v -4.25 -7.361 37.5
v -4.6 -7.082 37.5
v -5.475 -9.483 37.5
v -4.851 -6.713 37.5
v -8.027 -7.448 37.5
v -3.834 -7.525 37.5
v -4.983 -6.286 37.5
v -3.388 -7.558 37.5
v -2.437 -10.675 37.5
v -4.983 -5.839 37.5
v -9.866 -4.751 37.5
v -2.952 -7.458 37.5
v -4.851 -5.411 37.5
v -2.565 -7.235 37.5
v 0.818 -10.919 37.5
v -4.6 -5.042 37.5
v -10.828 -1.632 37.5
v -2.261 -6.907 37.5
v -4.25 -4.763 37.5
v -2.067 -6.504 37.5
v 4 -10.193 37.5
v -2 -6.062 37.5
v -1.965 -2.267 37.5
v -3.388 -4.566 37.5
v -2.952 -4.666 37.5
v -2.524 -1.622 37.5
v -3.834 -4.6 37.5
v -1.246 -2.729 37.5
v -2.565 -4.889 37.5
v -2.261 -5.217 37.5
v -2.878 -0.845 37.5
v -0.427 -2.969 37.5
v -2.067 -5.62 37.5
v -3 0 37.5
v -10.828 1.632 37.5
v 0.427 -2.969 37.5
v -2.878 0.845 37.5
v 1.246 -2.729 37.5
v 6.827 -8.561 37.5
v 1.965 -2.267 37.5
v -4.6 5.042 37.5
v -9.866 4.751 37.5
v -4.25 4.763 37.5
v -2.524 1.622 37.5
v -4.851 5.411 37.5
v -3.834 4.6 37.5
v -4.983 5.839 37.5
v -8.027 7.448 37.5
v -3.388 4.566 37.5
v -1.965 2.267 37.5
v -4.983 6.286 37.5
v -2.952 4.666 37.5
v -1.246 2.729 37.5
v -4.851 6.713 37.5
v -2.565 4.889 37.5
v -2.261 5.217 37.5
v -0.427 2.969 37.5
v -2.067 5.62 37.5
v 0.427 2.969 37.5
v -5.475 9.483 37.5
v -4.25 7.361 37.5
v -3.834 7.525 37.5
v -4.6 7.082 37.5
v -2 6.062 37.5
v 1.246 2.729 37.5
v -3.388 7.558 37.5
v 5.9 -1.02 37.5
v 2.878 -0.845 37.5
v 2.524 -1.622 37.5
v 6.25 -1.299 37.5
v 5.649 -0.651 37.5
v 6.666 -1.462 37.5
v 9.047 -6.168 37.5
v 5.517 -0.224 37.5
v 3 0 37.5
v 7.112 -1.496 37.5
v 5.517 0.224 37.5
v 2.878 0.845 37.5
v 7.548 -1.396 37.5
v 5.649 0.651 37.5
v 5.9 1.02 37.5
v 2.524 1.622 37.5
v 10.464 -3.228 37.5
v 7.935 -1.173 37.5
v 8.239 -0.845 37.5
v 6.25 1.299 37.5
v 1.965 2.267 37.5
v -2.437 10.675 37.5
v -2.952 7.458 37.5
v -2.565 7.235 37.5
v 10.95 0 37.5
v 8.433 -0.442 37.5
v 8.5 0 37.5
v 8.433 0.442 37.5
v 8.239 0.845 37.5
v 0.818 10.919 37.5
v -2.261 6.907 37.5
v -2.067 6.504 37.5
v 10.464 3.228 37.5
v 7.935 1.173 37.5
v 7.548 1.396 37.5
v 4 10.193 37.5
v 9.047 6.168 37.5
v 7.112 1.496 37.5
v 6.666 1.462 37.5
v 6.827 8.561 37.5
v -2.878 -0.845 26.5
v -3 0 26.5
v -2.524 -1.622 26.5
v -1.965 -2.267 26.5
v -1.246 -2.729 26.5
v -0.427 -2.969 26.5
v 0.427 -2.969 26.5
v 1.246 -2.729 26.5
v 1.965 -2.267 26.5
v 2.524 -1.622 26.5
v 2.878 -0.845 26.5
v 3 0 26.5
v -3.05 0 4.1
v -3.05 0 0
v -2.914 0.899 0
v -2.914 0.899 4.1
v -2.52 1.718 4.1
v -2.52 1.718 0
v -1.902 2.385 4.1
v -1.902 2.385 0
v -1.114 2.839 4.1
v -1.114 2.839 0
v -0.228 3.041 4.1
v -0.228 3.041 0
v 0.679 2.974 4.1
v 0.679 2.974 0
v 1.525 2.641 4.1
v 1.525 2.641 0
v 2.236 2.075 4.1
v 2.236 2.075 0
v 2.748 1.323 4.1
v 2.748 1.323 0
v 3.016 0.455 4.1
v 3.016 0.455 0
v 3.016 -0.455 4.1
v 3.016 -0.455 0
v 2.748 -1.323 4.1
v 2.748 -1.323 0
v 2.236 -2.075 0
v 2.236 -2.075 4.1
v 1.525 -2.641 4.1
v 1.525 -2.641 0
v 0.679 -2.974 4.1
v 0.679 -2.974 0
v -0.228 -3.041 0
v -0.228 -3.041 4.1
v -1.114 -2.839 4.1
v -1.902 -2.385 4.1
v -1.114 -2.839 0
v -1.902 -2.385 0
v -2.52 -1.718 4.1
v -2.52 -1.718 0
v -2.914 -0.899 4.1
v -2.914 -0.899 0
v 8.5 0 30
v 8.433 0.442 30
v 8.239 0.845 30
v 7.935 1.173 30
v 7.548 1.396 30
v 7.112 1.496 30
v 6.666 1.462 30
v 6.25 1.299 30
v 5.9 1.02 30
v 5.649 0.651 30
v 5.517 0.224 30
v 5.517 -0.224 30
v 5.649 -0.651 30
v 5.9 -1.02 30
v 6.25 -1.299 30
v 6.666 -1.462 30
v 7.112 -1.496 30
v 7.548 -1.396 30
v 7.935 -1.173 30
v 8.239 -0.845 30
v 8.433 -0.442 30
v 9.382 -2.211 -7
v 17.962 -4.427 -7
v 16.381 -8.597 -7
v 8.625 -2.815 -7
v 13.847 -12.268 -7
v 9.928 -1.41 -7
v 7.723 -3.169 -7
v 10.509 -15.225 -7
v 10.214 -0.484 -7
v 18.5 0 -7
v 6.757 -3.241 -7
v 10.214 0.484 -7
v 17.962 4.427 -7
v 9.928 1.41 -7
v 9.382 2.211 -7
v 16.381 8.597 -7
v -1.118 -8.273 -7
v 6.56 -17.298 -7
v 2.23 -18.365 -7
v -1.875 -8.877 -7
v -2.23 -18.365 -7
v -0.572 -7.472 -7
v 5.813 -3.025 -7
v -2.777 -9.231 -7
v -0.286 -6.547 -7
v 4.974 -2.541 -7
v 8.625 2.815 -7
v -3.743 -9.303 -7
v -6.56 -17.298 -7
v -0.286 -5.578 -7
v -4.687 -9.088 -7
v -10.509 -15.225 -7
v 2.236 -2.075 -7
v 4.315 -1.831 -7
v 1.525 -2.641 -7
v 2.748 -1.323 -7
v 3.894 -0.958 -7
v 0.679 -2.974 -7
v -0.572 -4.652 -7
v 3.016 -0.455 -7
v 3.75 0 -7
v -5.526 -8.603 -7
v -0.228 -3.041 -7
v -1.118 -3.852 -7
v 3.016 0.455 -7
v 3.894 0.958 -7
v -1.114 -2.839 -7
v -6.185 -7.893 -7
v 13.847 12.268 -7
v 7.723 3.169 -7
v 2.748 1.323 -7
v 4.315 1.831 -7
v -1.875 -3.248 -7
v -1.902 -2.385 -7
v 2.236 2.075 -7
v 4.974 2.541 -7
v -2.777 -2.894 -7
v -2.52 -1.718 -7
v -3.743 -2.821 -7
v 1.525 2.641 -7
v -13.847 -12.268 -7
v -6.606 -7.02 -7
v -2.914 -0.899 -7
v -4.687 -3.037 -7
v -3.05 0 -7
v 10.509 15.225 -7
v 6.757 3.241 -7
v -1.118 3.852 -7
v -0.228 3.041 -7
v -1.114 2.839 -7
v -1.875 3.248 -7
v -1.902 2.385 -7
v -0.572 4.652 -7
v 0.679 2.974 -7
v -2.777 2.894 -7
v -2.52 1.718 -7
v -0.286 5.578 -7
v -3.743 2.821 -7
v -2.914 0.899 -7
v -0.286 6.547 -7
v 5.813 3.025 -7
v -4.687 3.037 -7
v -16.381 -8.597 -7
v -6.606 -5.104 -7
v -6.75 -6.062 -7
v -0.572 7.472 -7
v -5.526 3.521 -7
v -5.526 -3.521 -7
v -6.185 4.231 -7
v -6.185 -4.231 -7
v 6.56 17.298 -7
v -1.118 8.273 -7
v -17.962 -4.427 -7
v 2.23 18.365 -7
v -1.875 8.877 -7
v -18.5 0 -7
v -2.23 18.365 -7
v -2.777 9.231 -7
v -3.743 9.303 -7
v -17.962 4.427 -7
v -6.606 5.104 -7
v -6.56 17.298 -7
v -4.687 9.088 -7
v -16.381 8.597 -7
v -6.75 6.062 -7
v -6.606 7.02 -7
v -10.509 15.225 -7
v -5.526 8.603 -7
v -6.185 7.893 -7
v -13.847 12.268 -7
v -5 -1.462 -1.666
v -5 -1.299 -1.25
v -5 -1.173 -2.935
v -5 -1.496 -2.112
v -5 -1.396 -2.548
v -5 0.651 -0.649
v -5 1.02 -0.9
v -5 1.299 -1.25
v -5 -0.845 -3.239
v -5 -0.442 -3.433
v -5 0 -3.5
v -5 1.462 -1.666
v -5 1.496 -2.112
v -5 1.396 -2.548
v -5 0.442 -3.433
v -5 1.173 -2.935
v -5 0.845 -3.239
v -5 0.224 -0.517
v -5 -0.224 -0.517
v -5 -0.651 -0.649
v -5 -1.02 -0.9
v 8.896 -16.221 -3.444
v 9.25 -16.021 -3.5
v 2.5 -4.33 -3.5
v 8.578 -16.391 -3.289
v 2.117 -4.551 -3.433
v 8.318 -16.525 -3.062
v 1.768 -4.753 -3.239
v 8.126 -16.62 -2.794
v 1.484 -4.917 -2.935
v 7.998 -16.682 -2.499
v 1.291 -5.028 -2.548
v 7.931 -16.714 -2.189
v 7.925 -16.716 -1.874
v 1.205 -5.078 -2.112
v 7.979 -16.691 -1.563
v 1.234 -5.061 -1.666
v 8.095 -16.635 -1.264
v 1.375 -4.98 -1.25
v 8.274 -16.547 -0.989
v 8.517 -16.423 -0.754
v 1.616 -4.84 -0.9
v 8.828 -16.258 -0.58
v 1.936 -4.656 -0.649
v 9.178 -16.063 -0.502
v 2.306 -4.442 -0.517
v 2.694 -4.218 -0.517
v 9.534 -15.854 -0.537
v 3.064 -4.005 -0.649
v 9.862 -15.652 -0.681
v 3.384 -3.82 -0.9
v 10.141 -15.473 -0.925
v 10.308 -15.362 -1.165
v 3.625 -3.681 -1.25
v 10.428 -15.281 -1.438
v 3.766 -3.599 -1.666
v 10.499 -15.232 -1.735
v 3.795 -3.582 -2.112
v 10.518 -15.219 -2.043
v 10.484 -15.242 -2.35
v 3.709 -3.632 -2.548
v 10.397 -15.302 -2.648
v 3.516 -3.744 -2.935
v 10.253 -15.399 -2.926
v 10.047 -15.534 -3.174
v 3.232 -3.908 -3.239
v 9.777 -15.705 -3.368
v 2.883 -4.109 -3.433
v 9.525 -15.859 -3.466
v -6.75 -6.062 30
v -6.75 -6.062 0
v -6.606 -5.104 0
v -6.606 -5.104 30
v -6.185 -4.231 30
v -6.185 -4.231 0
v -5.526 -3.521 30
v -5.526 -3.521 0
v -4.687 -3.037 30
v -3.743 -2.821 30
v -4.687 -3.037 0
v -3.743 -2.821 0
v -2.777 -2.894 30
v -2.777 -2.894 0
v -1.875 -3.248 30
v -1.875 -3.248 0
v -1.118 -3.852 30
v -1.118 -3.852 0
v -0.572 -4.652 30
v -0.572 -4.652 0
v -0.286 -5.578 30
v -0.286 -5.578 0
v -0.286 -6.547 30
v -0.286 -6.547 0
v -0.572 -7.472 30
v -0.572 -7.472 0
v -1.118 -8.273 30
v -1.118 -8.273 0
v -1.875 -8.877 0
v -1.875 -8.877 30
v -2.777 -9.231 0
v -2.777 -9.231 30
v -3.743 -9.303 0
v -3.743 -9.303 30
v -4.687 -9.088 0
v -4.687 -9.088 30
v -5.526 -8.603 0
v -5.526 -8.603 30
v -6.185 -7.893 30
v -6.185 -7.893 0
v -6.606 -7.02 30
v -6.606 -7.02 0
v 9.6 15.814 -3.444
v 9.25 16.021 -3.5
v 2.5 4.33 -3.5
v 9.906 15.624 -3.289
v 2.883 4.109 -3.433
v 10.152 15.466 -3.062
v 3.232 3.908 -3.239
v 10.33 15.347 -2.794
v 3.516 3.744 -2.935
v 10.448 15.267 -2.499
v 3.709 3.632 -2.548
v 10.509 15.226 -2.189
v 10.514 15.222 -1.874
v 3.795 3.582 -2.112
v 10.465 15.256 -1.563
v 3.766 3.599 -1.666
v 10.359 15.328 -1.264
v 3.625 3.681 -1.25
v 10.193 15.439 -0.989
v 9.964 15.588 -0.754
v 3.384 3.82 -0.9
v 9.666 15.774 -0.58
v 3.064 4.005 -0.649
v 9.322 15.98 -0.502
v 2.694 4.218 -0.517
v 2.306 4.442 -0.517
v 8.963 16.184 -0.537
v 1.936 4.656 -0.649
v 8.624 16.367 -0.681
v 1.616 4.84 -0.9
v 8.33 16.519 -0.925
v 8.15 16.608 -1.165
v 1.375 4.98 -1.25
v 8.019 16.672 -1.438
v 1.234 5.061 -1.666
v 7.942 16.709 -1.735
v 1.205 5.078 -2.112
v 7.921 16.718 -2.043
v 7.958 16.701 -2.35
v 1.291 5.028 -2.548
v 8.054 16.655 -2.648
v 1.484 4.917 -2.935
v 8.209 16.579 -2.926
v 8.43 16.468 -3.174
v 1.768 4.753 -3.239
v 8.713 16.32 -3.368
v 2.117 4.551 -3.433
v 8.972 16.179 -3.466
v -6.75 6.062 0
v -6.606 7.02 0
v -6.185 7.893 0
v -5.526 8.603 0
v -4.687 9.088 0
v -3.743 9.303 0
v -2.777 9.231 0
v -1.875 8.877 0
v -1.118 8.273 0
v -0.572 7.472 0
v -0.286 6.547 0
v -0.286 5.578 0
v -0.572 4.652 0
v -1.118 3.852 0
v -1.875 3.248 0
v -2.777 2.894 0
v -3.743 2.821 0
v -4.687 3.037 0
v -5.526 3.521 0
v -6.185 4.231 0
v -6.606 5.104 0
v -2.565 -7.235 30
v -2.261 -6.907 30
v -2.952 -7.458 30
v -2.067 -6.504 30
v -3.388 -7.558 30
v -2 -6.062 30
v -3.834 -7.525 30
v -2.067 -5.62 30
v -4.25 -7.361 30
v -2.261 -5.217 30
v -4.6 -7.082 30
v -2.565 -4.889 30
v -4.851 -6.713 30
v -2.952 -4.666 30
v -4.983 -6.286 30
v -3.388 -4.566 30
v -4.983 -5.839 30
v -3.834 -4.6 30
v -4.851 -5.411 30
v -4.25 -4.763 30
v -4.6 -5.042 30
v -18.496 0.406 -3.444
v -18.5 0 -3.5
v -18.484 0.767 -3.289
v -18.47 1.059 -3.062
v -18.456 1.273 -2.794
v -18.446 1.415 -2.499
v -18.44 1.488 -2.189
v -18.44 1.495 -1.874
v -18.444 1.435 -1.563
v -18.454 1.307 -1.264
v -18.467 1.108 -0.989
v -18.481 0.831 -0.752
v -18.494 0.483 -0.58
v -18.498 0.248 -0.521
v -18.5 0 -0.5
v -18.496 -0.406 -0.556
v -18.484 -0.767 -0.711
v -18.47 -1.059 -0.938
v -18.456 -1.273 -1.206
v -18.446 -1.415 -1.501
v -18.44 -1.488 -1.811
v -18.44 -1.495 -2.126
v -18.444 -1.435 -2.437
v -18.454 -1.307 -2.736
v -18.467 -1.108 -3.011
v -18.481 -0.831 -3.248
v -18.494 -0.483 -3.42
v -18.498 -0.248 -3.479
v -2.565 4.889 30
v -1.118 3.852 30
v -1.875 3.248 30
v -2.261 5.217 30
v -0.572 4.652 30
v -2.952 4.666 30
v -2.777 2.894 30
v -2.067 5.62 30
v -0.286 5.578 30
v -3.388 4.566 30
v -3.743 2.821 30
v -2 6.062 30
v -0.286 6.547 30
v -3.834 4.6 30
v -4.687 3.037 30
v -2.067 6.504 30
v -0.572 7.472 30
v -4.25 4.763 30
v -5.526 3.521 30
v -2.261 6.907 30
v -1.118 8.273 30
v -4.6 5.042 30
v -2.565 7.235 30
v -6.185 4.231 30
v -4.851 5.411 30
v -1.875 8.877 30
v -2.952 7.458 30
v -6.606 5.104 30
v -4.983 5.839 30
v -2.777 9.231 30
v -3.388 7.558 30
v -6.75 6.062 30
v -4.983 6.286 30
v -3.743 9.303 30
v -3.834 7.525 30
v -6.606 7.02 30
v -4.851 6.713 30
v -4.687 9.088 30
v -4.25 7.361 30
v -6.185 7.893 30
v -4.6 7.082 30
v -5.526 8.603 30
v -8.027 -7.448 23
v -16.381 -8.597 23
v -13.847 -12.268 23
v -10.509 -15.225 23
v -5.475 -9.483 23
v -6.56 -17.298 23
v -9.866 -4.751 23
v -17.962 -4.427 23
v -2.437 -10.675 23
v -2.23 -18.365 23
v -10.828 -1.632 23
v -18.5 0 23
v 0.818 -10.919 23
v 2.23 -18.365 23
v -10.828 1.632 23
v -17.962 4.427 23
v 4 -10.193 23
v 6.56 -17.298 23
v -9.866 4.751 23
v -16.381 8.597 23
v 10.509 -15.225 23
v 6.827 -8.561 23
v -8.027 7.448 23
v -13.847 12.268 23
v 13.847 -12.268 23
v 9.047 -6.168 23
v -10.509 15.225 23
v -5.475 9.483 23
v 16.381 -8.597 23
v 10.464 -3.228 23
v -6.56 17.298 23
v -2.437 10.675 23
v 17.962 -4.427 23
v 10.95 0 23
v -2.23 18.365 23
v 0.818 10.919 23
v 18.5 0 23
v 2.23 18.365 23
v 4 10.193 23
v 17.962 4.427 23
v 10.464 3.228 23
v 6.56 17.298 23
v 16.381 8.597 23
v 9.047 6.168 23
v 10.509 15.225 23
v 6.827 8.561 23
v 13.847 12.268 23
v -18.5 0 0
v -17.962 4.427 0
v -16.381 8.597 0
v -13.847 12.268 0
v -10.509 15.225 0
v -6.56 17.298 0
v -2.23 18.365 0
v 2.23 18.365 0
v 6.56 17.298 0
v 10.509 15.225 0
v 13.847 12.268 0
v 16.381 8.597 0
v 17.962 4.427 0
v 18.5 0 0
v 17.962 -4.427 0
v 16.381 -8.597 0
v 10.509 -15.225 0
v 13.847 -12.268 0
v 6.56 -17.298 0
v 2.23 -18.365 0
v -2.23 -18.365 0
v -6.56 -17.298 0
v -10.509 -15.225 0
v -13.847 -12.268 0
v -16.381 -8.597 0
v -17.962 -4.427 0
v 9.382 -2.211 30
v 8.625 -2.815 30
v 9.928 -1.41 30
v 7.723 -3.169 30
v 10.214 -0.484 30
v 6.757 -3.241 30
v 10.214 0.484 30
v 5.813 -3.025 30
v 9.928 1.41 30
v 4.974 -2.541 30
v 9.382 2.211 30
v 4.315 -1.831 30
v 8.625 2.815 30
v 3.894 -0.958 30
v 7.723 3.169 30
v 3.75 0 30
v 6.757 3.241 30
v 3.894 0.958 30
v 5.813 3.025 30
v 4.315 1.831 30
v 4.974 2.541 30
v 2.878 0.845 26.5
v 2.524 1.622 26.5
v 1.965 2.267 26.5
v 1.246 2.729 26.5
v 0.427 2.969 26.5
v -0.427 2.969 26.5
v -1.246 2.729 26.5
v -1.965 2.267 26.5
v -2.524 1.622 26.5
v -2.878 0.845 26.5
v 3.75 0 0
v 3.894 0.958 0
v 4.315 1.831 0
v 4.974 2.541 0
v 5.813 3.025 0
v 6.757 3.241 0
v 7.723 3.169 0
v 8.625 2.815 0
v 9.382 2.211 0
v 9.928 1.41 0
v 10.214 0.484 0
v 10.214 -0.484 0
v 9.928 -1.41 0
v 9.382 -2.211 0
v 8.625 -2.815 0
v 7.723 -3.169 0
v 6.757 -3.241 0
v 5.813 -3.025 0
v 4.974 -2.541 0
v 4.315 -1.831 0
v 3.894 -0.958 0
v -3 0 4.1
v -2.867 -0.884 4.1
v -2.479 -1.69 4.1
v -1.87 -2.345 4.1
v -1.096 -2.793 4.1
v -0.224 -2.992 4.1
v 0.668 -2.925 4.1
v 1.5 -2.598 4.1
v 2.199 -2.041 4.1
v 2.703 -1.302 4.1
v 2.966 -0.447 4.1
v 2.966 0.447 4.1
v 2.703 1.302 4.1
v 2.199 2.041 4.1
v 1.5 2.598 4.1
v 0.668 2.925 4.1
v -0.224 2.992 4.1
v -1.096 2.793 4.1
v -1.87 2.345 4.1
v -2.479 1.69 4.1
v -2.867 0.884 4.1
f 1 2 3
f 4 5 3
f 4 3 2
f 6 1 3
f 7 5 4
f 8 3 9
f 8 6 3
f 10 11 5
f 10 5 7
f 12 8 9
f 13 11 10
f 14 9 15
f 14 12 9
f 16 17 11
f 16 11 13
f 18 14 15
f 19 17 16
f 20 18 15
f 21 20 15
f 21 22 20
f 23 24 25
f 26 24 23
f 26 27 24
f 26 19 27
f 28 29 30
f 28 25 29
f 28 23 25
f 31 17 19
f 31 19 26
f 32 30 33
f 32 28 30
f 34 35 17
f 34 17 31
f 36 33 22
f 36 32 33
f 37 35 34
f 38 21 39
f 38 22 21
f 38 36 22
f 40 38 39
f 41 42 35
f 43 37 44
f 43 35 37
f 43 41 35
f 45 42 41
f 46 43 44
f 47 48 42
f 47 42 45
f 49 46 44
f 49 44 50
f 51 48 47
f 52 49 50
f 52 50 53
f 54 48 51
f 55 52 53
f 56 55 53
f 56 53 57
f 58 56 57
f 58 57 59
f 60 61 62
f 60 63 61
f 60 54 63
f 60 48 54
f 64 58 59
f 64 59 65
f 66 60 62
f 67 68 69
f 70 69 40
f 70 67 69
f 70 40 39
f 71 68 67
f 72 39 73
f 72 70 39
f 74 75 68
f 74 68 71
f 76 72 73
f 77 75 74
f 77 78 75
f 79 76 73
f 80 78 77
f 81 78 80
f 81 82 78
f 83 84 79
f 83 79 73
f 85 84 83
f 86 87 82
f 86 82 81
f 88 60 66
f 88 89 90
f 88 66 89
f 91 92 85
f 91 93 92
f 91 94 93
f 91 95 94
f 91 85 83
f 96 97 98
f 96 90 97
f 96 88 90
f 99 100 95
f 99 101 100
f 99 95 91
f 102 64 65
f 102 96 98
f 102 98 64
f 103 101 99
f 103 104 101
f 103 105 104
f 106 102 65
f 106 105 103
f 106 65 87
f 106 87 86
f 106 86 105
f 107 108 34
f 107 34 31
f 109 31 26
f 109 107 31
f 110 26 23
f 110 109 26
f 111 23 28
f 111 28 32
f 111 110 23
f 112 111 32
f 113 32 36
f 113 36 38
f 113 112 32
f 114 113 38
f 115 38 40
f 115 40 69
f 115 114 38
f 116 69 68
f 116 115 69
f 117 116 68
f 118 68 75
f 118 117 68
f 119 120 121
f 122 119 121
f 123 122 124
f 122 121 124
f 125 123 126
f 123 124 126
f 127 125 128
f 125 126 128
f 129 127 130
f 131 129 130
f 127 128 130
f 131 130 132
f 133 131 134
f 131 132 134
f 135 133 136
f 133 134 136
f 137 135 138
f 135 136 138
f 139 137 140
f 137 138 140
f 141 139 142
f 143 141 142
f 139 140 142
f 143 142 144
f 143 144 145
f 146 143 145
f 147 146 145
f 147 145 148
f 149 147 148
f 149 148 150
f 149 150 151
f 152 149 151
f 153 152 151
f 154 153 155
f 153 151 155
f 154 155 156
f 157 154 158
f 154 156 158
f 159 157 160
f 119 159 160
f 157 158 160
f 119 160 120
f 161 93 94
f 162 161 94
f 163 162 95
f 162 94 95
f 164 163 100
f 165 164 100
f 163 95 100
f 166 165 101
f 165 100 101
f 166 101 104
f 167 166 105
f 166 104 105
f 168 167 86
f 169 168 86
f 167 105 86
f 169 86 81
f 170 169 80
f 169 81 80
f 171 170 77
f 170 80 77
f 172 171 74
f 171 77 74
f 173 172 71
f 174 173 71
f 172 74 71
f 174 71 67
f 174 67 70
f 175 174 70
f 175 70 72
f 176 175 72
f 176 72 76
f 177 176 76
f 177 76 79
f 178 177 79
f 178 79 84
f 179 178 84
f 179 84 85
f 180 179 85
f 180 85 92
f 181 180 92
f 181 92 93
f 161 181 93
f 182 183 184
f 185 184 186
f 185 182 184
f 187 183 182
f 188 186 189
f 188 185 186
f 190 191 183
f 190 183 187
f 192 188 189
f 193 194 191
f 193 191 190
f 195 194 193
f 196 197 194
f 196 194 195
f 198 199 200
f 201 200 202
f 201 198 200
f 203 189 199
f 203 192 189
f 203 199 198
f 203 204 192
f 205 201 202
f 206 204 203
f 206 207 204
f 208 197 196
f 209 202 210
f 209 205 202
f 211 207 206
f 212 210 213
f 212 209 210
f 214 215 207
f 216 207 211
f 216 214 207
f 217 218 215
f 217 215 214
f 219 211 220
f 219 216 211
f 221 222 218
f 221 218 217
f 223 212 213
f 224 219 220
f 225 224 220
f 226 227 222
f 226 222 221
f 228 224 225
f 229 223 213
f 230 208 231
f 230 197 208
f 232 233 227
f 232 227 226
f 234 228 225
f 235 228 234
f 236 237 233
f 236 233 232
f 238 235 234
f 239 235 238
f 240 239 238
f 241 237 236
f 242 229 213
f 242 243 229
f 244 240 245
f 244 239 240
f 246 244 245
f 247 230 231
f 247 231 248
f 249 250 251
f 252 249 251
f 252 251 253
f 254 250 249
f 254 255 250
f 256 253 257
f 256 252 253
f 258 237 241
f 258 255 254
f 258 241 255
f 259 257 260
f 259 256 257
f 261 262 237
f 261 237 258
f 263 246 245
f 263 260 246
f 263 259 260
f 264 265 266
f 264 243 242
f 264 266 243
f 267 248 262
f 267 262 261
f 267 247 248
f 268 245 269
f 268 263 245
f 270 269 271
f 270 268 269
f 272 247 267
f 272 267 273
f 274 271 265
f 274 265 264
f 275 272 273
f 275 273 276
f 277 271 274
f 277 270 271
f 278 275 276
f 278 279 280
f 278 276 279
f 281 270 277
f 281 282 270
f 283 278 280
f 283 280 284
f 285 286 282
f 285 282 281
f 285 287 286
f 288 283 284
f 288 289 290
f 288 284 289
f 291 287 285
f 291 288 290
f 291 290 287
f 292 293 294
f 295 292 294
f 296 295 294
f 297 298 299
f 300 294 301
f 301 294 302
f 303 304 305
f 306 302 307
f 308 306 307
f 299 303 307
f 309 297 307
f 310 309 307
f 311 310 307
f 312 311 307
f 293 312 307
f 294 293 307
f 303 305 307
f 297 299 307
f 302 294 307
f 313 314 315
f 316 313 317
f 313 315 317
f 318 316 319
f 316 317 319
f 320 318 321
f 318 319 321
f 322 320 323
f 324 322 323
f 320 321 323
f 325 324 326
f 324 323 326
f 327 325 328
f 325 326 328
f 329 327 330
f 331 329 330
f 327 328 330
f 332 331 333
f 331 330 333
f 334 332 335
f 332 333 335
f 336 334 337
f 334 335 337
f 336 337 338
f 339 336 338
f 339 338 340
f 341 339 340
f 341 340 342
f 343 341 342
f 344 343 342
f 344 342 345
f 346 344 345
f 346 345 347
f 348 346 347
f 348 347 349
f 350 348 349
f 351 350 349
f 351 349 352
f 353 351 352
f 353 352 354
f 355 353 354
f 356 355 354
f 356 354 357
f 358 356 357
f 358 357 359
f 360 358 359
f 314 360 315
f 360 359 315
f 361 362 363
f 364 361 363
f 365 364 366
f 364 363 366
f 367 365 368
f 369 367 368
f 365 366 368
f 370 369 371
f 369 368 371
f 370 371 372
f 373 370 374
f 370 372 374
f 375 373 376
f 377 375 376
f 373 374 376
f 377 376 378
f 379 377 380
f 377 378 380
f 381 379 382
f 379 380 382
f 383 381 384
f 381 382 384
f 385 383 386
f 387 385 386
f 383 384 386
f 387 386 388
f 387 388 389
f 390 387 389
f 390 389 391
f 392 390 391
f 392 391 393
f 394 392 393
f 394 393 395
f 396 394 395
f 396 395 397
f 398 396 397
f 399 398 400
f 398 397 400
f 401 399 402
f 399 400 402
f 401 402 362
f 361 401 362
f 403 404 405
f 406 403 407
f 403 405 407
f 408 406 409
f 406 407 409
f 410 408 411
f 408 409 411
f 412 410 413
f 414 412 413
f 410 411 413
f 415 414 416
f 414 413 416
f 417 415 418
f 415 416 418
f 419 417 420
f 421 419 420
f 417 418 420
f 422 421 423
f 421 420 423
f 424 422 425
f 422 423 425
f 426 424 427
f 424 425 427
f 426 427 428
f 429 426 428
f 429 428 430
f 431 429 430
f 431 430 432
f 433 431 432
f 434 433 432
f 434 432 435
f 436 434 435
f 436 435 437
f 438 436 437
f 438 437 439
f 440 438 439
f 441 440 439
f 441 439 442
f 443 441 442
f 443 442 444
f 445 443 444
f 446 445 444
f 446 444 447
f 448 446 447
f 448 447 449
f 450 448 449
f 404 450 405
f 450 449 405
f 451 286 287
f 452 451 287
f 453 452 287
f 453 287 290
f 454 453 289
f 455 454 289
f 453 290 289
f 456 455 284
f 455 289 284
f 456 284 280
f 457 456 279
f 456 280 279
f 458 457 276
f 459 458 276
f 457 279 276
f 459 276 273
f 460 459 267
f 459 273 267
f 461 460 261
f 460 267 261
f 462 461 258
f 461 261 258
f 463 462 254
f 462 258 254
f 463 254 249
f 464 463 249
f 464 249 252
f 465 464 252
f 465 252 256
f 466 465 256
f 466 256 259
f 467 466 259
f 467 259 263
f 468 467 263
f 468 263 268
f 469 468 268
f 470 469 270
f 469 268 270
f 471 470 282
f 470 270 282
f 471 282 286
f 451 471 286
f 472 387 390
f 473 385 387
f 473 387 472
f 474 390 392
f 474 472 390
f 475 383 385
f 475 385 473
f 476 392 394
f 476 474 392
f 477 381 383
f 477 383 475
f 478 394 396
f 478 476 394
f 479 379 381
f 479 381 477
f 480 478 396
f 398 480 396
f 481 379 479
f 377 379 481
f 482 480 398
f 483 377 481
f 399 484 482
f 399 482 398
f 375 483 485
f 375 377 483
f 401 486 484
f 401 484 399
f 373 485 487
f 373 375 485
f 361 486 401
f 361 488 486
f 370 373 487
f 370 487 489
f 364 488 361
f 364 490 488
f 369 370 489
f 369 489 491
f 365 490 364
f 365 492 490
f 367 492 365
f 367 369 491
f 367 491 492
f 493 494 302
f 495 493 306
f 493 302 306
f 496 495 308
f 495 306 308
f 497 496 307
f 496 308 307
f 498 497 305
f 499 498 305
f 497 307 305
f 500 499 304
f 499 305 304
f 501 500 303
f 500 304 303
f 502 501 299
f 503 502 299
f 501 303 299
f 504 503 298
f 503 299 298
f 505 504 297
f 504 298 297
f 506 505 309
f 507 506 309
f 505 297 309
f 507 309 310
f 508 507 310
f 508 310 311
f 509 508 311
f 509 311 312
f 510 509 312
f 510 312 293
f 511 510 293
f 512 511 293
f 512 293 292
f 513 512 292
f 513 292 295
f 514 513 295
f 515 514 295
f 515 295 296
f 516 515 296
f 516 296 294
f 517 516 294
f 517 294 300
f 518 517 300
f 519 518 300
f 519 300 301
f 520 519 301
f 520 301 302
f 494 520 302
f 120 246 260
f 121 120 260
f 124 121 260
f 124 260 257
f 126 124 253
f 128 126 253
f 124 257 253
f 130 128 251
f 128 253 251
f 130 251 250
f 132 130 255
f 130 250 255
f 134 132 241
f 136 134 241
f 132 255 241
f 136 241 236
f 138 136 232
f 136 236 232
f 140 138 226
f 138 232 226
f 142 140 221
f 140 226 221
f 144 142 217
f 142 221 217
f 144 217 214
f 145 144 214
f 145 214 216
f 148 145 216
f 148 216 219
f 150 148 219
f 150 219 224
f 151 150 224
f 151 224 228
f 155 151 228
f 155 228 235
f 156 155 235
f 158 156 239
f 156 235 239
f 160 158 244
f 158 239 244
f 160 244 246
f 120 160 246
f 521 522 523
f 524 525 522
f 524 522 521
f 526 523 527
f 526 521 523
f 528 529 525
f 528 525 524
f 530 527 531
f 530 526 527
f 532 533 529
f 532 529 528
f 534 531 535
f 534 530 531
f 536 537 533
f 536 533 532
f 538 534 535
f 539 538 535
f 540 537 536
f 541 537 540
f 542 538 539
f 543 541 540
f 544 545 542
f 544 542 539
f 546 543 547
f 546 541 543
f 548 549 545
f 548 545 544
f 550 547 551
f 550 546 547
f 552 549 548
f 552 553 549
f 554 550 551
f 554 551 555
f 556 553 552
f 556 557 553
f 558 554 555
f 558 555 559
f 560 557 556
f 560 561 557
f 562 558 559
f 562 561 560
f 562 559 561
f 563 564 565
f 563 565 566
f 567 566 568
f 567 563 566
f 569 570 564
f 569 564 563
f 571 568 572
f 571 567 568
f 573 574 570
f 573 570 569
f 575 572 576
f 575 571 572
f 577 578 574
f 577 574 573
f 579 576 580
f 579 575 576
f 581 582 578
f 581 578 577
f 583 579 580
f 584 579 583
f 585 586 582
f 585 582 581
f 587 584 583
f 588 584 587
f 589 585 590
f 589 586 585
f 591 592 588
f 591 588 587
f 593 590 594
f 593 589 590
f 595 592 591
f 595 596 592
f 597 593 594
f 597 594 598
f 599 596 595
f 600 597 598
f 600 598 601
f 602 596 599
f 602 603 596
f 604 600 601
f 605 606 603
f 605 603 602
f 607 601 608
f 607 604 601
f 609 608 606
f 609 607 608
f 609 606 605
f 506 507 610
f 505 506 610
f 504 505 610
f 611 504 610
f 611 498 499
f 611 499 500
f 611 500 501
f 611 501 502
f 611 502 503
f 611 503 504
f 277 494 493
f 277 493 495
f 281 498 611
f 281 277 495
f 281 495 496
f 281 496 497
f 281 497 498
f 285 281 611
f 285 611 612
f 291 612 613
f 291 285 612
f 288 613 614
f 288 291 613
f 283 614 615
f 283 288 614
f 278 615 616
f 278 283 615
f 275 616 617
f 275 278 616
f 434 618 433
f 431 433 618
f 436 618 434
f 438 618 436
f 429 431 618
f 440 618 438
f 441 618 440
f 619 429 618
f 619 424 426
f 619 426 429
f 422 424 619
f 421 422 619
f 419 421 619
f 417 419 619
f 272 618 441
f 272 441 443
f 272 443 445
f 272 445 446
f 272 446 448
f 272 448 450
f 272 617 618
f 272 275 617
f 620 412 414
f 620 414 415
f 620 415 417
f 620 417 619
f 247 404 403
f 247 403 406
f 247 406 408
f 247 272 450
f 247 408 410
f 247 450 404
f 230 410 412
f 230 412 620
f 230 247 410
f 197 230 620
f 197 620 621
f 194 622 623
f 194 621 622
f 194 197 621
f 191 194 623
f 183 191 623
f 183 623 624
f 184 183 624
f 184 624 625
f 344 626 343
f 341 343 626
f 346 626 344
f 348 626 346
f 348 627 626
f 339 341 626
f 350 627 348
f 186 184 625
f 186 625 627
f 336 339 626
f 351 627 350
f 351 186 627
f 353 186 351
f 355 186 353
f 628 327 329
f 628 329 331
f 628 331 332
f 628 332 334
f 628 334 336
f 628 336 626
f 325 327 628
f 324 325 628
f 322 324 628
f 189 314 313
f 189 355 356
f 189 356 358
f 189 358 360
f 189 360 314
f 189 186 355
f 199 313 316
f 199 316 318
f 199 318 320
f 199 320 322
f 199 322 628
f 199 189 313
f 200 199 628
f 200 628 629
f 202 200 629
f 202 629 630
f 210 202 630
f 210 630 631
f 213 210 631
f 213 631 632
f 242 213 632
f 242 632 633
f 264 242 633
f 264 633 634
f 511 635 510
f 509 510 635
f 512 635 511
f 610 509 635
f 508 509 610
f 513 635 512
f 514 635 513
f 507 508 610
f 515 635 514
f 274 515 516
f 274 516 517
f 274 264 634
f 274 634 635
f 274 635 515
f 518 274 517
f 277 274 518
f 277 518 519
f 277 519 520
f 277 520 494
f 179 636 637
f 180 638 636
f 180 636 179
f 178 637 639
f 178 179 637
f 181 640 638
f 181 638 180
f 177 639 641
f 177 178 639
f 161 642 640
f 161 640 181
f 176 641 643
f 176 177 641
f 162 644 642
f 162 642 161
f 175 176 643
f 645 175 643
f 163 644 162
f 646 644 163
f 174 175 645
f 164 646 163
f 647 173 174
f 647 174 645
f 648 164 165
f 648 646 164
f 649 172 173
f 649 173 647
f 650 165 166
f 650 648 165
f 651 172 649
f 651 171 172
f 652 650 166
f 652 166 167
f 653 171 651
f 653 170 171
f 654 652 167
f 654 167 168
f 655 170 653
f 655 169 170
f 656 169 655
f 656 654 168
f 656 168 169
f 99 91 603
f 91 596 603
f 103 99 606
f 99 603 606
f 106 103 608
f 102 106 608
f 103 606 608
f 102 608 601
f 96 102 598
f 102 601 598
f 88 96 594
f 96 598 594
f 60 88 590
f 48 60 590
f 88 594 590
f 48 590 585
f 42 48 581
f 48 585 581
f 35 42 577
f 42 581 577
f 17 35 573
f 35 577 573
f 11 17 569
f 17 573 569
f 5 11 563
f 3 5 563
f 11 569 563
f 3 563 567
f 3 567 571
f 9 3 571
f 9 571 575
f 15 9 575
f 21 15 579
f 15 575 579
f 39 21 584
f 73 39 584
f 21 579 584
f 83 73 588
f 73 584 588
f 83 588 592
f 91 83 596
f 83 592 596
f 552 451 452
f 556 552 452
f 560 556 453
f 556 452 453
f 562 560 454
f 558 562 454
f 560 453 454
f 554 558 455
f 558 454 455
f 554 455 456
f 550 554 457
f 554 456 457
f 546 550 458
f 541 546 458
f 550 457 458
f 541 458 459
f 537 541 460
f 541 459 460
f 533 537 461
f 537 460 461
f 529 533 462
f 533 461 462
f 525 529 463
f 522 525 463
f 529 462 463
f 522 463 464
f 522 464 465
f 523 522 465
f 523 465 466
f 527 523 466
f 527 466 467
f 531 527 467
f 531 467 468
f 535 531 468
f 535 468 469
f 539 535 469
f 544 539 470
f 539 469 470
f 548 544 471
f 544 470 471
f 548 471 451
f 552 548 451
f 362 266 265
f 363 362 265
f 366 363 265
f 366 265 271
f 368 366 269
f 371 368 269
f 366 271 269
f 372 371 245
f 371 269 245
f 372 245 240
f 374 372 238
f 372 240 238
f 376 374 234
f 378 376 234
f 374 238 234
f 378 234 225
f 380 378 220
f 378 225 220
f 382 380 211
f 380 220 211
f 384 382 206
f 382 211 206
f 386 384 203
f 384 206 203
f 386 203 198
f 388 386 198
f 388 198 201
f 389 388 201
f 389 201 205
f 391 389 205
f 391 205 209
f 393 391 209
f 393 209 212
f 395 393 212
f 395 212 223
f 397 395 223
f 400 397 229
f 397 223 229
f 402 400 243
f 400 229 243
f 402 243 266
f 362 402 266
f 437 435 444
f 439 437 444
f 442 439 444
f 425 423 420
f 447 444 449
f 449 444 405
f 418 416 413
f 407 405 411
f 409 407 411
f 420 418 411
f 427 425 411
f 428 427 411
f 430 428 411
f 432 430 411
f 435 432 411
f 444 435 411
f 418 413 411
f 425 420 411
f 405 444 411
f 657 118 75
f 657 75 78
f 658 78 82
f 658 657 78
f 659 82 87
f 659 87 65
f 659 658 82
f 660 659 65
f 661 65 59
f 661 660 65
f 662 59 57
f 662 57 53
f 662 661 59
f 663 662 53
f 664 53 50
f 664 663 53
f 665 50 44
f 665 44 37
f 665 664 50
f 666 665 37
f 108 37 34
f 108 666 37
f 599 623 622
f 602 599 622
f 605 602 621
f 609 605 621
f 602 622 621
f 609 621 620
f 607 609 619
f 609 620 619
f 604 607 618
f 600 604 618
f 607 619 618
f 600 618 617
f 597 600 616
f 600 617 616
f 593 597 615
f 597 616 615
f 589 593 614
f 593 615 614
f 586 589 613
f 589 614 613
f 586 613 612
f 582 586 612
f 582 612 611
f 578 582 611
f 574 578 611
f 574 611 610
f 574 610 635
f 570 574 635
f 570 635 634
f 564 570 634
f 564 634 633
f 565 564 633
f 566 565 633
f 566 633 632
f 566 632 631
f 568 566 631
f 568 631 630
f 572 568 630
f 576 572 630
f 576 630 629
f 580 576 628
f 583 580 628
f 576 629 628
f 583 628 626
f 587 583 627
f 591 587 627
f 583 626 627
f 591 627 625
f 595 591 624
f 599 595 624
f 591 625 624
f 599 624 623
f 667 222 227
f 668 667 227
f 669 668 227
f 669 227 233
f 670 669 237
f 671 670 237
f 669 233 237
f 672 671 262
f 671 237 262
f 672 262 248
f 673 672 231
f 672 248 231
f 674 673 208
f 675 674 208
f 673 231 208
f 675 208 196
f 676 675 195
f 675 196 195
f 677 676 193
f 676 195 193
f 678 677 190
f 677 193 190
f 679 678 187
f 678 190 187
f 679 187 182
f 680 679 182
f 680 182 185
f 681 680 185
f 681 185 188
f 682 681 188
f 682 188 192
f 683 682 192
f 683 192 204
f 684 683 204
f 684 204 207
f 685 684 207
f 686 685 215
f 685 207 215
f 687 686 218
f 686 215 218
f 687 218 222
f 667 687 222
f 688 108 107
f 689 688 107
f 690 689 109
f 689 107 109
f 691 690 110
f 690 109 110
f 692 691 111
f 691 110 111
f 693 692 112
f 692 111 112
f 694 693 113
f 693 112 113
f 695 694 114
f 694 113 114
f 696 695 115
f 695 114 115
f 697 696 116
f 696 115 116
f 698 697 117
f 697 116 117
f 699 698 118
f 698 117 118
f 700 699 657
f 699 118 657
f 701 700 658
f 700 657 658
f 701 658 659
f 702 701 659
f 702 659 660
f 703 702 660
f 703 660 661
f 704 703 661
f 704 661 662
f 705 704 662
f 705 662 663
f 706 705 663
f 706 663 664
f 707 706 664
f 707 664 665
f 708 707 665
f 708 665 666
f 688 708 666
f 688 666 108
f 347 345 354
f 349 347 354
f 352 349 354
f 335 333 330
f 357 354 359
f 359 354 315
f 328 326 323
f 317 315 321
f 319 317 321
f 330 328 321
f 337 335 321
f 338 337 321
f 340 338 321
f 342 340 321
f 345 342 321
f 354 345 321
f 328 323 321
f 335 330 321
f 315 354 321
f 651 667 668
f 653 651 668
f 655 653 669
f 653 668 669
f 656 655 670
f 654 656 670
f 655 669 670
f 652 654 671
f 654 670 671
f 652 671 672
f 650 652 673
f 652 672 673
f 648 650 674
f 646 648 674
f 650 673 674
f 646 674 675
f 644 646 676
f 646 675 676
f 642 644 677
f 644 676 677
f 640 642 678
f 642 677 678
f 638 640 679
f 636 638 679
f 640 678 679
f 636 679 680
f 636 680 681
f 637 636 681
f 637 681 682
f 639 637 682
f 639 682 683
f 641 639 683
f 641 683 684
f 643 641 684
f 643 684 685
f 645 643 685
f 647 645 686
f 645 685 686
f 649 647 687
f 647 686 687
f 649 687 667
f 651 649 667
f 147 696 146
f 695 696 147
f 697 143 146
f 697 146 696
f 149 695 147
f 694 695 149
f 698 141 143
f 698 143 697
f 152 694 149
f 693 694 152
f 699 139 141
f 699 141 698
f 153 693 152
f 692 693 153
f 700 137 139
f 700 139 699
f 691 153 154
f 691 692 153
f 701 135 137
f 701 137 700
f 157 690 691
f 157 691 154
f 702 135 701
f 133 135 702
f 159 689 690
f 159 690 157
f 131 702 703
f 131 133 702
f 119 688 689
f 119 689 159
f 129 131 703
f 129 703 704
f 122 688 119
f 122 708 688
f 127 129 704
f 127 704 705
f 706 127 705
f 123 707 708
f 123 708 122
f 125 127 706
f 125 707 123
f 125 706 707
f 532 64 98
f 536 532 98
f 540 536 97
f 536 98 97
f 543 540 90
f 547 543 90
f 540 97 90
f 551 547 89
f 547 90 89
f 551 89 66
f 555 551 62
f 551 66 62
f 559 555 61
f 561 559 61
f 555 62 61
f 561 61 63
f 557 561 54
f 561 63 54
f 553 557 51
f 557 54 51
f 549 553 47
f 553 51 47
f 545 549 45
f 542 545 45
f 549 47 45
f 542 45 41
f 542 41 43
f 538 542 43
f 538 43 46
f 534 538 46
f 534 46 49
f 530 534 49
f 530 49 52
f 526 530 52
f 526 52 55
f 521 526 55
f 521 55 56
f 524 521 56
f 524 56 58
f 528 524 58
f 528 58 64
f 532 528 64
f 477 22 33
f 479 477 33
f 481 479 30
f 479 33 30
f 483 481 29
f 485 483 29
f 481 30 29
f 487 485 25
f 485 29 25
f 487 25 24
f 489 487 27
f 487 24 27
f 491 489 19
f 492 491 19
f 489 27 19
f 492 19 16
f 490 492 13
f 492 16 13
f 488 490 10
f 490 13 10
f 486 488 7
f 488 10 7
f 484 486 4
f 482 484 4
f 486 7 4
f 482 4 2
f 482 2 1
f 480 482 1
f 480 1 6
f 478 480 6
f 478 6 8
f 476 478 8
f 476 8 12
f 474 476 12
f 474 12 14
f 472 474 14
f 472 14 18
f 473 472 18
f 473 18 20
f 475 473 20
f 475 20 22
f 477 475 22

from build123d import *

# Parameters (mm, degrees)
SKETCH1_R           = 18.5
BOSS_EXTRUDE1_DEPTH = 23
SKETCH2_R           = 10.95
BOSS_EXTRUDE2_DEPTH = 3.5
SKETCH4_R           = 3.05
CUT_EXTRUDE1_DEPTH  = 4.1
SKETCH5_R           = 1.5
CUT_EXTRUDE2_DEPTH  = 4
SKETCH7_R           = 10.95
SKETCH7_R_2         = 3
BOSS_EXTRUDE3_DEPTH = 11
SKETCH9_R           = 1.5
CUT_EXTRUDE4_DEPTH  = 46.724719791
SKETCH10_R          = 3
CUT_EXTRUDE5_DEPTH  = 46.724719791
SKETCH11_R          = 3.25
CUT_EXTRUDE8_DEPTH  = 30
BOSS_EXTRUDE4_START = 7
SKETCH12_R          = 18.5
SKETCH12_R_2        = 3.25
SKETCH12_R_3        = 3.05
BOSS_EXTRUDE4_DEPTH = 7
CUT_EXTRUDE9_START  = -5
SKETCH13_R          = 1.5
CUT_EXTRUDE9_DEPTH  = 17
CIRPATTERN1_COUNT   = 3


with BuildPart() as part:
    # Sketch1 → Boss-Extrude1 (new body)
    with BuildSketch(Plane.XY):
        Circle(SKETCH1_R)
    extrude(amount=BOSS_EXTRUDE1_DEPTH)

    # Sketch2 → Boss-Extrude2 (add)
    with BuildSketch(Plane.XY.offset(23)):
        Circle(SKETCH2_R)
    extrude(amount=BOSS_EXTRUDE2_DEPTH)

    # Sketch4 → Cut-Extrude1 (cut)
    with BuildSketch(Plane(origin=(0, 0, 0), x_dir=(-1, 0, 0), z_dir=(0, 0, -1))):
        Circle(SKETCH4_R)
    extrude(amount=-CUT_EXTRUDE1_DEPTH, mode=Mode.SUBTRACT)

    # Sketch5 → Cut-Extrude2 (cut)
    with BuildSketch(Plane(origin=(0, 0, 4.1), x_dir=(-1, 0, 0), z_dir=(0, 0, -1))):
        Circle(SKETCH5_R)
    extrude(amount=-CUT_EXTRUDE2_DEPTH, mode=Mode.SUBTRACT)

    # Sketch7 → Boss-Extrude3 (add)
    with BuildSketch(Plane.XY.offset(26.5)):
        Circle(SKETCH7_R)
        Circle(SKETCH7_R_2, mode=Mode.SUBTRACT)
    extrude(amount=BOSS_EXTRUDE3_DEPTH)

    # Sketch9 → Cut-Extrude4 (cut, through all)
    with BuildSketch(Plane.XY.offset(37.5)):
        with Locations((7, 0)):
            Circle(SKETCH9_R)
        with Locations((-3.5, -6.062177826)):
            Circle(SKETCH9_R)
        with Locations((-3.5, 6.062177826)):
            Circle(SKETCH9_R)
    extrude(amount=-CUT_EXTRUDE4_DEPTH, mode=Mode.SUBTRACT)

    # Sketch10 → Cut-Extrude5 (cut, through all)
    with BuildSketch(Plane.XY.offset(37.5)):
        Circle(SKETCH10_R)
    extrude(amount=-CUT_EXTRUDE5_DEPTH, mode=Mode.SUBTRACT)

    # Sketch11 → Cut-Extrude8 (cut)
    with BuildSketch(Plane(origin=(0, 0, 0), x_dir=(-1, 0, 0), z_dir=(0, 0, -1))):
        with Locations((3.5, -6.062177826)):
            Circle(SKETCH11_R)
        with Locations((3.5, 6.062177826)):
            Circle(SKETCH11_R)
        with Locations((-7, 0)):
            Circle(SKETCH11_R)
    extrude(amount=-CUT_EXTRUDE8_DEPTH, mode=Mode.SUBTRACT)

    # Sketch12 → Boss-Extrude4 (add)
    with BuildSketch(Plane(origin=(0, 0, 0), x_dir=(-1, 0, 0), z_dir=(0, 0, -1)).offset(BOSS_EXTRUDE4_START)):
        Circle(SKETCH12_R)
        with Locations((3.5, 6.062177826)):
            Circle(SKETCH12_R_2, mode=Mode.SUBTRACT)
        with Locations((3.5, -6.062177826)):
            Circle(SKETCH12_R_2, mode=Mode.SUBTRACT)
        with Locations((-7, 0)):
            Circle(SKETCH12_R_2, mode=Mode.SUBTRACT)
        Circle(SKETCH12_R_3, mode=Mode.SUBTRACT)
    extrude(amount=-BOSS_EXTRUDE4_DEPTH)

    # Sketch13 → Cut-Extrude9 (cut)
    with BuildSketch(Plane(origin=(0, 0, 0), x_dir=(0, 0, -1), z_dir=(1, 0, 0)).offset(CUT_EXTRUDE9_START)):
        with Locations((2, 0)):
            Circle(SKETCH13_R)
    cut_extrude9 = extrude(amount=-CUT_EXTRUDE9_DEPTH, mode=Mode.SUBTRACT)

    # CirPattern1: Cut-Extrude9 ×3 about axis
    cirpattern1_axis = Axis((0, 0, 23), (0, 0, -1))
    for i in range(1, CIRPATTERN1_COUNT):
        add(cut_extrude9.rotate(cirpattern1_axis, i * 360 / CIRPATTERN1_COUNT), mode=Mode.SUBTRACT)


solid = part.part
